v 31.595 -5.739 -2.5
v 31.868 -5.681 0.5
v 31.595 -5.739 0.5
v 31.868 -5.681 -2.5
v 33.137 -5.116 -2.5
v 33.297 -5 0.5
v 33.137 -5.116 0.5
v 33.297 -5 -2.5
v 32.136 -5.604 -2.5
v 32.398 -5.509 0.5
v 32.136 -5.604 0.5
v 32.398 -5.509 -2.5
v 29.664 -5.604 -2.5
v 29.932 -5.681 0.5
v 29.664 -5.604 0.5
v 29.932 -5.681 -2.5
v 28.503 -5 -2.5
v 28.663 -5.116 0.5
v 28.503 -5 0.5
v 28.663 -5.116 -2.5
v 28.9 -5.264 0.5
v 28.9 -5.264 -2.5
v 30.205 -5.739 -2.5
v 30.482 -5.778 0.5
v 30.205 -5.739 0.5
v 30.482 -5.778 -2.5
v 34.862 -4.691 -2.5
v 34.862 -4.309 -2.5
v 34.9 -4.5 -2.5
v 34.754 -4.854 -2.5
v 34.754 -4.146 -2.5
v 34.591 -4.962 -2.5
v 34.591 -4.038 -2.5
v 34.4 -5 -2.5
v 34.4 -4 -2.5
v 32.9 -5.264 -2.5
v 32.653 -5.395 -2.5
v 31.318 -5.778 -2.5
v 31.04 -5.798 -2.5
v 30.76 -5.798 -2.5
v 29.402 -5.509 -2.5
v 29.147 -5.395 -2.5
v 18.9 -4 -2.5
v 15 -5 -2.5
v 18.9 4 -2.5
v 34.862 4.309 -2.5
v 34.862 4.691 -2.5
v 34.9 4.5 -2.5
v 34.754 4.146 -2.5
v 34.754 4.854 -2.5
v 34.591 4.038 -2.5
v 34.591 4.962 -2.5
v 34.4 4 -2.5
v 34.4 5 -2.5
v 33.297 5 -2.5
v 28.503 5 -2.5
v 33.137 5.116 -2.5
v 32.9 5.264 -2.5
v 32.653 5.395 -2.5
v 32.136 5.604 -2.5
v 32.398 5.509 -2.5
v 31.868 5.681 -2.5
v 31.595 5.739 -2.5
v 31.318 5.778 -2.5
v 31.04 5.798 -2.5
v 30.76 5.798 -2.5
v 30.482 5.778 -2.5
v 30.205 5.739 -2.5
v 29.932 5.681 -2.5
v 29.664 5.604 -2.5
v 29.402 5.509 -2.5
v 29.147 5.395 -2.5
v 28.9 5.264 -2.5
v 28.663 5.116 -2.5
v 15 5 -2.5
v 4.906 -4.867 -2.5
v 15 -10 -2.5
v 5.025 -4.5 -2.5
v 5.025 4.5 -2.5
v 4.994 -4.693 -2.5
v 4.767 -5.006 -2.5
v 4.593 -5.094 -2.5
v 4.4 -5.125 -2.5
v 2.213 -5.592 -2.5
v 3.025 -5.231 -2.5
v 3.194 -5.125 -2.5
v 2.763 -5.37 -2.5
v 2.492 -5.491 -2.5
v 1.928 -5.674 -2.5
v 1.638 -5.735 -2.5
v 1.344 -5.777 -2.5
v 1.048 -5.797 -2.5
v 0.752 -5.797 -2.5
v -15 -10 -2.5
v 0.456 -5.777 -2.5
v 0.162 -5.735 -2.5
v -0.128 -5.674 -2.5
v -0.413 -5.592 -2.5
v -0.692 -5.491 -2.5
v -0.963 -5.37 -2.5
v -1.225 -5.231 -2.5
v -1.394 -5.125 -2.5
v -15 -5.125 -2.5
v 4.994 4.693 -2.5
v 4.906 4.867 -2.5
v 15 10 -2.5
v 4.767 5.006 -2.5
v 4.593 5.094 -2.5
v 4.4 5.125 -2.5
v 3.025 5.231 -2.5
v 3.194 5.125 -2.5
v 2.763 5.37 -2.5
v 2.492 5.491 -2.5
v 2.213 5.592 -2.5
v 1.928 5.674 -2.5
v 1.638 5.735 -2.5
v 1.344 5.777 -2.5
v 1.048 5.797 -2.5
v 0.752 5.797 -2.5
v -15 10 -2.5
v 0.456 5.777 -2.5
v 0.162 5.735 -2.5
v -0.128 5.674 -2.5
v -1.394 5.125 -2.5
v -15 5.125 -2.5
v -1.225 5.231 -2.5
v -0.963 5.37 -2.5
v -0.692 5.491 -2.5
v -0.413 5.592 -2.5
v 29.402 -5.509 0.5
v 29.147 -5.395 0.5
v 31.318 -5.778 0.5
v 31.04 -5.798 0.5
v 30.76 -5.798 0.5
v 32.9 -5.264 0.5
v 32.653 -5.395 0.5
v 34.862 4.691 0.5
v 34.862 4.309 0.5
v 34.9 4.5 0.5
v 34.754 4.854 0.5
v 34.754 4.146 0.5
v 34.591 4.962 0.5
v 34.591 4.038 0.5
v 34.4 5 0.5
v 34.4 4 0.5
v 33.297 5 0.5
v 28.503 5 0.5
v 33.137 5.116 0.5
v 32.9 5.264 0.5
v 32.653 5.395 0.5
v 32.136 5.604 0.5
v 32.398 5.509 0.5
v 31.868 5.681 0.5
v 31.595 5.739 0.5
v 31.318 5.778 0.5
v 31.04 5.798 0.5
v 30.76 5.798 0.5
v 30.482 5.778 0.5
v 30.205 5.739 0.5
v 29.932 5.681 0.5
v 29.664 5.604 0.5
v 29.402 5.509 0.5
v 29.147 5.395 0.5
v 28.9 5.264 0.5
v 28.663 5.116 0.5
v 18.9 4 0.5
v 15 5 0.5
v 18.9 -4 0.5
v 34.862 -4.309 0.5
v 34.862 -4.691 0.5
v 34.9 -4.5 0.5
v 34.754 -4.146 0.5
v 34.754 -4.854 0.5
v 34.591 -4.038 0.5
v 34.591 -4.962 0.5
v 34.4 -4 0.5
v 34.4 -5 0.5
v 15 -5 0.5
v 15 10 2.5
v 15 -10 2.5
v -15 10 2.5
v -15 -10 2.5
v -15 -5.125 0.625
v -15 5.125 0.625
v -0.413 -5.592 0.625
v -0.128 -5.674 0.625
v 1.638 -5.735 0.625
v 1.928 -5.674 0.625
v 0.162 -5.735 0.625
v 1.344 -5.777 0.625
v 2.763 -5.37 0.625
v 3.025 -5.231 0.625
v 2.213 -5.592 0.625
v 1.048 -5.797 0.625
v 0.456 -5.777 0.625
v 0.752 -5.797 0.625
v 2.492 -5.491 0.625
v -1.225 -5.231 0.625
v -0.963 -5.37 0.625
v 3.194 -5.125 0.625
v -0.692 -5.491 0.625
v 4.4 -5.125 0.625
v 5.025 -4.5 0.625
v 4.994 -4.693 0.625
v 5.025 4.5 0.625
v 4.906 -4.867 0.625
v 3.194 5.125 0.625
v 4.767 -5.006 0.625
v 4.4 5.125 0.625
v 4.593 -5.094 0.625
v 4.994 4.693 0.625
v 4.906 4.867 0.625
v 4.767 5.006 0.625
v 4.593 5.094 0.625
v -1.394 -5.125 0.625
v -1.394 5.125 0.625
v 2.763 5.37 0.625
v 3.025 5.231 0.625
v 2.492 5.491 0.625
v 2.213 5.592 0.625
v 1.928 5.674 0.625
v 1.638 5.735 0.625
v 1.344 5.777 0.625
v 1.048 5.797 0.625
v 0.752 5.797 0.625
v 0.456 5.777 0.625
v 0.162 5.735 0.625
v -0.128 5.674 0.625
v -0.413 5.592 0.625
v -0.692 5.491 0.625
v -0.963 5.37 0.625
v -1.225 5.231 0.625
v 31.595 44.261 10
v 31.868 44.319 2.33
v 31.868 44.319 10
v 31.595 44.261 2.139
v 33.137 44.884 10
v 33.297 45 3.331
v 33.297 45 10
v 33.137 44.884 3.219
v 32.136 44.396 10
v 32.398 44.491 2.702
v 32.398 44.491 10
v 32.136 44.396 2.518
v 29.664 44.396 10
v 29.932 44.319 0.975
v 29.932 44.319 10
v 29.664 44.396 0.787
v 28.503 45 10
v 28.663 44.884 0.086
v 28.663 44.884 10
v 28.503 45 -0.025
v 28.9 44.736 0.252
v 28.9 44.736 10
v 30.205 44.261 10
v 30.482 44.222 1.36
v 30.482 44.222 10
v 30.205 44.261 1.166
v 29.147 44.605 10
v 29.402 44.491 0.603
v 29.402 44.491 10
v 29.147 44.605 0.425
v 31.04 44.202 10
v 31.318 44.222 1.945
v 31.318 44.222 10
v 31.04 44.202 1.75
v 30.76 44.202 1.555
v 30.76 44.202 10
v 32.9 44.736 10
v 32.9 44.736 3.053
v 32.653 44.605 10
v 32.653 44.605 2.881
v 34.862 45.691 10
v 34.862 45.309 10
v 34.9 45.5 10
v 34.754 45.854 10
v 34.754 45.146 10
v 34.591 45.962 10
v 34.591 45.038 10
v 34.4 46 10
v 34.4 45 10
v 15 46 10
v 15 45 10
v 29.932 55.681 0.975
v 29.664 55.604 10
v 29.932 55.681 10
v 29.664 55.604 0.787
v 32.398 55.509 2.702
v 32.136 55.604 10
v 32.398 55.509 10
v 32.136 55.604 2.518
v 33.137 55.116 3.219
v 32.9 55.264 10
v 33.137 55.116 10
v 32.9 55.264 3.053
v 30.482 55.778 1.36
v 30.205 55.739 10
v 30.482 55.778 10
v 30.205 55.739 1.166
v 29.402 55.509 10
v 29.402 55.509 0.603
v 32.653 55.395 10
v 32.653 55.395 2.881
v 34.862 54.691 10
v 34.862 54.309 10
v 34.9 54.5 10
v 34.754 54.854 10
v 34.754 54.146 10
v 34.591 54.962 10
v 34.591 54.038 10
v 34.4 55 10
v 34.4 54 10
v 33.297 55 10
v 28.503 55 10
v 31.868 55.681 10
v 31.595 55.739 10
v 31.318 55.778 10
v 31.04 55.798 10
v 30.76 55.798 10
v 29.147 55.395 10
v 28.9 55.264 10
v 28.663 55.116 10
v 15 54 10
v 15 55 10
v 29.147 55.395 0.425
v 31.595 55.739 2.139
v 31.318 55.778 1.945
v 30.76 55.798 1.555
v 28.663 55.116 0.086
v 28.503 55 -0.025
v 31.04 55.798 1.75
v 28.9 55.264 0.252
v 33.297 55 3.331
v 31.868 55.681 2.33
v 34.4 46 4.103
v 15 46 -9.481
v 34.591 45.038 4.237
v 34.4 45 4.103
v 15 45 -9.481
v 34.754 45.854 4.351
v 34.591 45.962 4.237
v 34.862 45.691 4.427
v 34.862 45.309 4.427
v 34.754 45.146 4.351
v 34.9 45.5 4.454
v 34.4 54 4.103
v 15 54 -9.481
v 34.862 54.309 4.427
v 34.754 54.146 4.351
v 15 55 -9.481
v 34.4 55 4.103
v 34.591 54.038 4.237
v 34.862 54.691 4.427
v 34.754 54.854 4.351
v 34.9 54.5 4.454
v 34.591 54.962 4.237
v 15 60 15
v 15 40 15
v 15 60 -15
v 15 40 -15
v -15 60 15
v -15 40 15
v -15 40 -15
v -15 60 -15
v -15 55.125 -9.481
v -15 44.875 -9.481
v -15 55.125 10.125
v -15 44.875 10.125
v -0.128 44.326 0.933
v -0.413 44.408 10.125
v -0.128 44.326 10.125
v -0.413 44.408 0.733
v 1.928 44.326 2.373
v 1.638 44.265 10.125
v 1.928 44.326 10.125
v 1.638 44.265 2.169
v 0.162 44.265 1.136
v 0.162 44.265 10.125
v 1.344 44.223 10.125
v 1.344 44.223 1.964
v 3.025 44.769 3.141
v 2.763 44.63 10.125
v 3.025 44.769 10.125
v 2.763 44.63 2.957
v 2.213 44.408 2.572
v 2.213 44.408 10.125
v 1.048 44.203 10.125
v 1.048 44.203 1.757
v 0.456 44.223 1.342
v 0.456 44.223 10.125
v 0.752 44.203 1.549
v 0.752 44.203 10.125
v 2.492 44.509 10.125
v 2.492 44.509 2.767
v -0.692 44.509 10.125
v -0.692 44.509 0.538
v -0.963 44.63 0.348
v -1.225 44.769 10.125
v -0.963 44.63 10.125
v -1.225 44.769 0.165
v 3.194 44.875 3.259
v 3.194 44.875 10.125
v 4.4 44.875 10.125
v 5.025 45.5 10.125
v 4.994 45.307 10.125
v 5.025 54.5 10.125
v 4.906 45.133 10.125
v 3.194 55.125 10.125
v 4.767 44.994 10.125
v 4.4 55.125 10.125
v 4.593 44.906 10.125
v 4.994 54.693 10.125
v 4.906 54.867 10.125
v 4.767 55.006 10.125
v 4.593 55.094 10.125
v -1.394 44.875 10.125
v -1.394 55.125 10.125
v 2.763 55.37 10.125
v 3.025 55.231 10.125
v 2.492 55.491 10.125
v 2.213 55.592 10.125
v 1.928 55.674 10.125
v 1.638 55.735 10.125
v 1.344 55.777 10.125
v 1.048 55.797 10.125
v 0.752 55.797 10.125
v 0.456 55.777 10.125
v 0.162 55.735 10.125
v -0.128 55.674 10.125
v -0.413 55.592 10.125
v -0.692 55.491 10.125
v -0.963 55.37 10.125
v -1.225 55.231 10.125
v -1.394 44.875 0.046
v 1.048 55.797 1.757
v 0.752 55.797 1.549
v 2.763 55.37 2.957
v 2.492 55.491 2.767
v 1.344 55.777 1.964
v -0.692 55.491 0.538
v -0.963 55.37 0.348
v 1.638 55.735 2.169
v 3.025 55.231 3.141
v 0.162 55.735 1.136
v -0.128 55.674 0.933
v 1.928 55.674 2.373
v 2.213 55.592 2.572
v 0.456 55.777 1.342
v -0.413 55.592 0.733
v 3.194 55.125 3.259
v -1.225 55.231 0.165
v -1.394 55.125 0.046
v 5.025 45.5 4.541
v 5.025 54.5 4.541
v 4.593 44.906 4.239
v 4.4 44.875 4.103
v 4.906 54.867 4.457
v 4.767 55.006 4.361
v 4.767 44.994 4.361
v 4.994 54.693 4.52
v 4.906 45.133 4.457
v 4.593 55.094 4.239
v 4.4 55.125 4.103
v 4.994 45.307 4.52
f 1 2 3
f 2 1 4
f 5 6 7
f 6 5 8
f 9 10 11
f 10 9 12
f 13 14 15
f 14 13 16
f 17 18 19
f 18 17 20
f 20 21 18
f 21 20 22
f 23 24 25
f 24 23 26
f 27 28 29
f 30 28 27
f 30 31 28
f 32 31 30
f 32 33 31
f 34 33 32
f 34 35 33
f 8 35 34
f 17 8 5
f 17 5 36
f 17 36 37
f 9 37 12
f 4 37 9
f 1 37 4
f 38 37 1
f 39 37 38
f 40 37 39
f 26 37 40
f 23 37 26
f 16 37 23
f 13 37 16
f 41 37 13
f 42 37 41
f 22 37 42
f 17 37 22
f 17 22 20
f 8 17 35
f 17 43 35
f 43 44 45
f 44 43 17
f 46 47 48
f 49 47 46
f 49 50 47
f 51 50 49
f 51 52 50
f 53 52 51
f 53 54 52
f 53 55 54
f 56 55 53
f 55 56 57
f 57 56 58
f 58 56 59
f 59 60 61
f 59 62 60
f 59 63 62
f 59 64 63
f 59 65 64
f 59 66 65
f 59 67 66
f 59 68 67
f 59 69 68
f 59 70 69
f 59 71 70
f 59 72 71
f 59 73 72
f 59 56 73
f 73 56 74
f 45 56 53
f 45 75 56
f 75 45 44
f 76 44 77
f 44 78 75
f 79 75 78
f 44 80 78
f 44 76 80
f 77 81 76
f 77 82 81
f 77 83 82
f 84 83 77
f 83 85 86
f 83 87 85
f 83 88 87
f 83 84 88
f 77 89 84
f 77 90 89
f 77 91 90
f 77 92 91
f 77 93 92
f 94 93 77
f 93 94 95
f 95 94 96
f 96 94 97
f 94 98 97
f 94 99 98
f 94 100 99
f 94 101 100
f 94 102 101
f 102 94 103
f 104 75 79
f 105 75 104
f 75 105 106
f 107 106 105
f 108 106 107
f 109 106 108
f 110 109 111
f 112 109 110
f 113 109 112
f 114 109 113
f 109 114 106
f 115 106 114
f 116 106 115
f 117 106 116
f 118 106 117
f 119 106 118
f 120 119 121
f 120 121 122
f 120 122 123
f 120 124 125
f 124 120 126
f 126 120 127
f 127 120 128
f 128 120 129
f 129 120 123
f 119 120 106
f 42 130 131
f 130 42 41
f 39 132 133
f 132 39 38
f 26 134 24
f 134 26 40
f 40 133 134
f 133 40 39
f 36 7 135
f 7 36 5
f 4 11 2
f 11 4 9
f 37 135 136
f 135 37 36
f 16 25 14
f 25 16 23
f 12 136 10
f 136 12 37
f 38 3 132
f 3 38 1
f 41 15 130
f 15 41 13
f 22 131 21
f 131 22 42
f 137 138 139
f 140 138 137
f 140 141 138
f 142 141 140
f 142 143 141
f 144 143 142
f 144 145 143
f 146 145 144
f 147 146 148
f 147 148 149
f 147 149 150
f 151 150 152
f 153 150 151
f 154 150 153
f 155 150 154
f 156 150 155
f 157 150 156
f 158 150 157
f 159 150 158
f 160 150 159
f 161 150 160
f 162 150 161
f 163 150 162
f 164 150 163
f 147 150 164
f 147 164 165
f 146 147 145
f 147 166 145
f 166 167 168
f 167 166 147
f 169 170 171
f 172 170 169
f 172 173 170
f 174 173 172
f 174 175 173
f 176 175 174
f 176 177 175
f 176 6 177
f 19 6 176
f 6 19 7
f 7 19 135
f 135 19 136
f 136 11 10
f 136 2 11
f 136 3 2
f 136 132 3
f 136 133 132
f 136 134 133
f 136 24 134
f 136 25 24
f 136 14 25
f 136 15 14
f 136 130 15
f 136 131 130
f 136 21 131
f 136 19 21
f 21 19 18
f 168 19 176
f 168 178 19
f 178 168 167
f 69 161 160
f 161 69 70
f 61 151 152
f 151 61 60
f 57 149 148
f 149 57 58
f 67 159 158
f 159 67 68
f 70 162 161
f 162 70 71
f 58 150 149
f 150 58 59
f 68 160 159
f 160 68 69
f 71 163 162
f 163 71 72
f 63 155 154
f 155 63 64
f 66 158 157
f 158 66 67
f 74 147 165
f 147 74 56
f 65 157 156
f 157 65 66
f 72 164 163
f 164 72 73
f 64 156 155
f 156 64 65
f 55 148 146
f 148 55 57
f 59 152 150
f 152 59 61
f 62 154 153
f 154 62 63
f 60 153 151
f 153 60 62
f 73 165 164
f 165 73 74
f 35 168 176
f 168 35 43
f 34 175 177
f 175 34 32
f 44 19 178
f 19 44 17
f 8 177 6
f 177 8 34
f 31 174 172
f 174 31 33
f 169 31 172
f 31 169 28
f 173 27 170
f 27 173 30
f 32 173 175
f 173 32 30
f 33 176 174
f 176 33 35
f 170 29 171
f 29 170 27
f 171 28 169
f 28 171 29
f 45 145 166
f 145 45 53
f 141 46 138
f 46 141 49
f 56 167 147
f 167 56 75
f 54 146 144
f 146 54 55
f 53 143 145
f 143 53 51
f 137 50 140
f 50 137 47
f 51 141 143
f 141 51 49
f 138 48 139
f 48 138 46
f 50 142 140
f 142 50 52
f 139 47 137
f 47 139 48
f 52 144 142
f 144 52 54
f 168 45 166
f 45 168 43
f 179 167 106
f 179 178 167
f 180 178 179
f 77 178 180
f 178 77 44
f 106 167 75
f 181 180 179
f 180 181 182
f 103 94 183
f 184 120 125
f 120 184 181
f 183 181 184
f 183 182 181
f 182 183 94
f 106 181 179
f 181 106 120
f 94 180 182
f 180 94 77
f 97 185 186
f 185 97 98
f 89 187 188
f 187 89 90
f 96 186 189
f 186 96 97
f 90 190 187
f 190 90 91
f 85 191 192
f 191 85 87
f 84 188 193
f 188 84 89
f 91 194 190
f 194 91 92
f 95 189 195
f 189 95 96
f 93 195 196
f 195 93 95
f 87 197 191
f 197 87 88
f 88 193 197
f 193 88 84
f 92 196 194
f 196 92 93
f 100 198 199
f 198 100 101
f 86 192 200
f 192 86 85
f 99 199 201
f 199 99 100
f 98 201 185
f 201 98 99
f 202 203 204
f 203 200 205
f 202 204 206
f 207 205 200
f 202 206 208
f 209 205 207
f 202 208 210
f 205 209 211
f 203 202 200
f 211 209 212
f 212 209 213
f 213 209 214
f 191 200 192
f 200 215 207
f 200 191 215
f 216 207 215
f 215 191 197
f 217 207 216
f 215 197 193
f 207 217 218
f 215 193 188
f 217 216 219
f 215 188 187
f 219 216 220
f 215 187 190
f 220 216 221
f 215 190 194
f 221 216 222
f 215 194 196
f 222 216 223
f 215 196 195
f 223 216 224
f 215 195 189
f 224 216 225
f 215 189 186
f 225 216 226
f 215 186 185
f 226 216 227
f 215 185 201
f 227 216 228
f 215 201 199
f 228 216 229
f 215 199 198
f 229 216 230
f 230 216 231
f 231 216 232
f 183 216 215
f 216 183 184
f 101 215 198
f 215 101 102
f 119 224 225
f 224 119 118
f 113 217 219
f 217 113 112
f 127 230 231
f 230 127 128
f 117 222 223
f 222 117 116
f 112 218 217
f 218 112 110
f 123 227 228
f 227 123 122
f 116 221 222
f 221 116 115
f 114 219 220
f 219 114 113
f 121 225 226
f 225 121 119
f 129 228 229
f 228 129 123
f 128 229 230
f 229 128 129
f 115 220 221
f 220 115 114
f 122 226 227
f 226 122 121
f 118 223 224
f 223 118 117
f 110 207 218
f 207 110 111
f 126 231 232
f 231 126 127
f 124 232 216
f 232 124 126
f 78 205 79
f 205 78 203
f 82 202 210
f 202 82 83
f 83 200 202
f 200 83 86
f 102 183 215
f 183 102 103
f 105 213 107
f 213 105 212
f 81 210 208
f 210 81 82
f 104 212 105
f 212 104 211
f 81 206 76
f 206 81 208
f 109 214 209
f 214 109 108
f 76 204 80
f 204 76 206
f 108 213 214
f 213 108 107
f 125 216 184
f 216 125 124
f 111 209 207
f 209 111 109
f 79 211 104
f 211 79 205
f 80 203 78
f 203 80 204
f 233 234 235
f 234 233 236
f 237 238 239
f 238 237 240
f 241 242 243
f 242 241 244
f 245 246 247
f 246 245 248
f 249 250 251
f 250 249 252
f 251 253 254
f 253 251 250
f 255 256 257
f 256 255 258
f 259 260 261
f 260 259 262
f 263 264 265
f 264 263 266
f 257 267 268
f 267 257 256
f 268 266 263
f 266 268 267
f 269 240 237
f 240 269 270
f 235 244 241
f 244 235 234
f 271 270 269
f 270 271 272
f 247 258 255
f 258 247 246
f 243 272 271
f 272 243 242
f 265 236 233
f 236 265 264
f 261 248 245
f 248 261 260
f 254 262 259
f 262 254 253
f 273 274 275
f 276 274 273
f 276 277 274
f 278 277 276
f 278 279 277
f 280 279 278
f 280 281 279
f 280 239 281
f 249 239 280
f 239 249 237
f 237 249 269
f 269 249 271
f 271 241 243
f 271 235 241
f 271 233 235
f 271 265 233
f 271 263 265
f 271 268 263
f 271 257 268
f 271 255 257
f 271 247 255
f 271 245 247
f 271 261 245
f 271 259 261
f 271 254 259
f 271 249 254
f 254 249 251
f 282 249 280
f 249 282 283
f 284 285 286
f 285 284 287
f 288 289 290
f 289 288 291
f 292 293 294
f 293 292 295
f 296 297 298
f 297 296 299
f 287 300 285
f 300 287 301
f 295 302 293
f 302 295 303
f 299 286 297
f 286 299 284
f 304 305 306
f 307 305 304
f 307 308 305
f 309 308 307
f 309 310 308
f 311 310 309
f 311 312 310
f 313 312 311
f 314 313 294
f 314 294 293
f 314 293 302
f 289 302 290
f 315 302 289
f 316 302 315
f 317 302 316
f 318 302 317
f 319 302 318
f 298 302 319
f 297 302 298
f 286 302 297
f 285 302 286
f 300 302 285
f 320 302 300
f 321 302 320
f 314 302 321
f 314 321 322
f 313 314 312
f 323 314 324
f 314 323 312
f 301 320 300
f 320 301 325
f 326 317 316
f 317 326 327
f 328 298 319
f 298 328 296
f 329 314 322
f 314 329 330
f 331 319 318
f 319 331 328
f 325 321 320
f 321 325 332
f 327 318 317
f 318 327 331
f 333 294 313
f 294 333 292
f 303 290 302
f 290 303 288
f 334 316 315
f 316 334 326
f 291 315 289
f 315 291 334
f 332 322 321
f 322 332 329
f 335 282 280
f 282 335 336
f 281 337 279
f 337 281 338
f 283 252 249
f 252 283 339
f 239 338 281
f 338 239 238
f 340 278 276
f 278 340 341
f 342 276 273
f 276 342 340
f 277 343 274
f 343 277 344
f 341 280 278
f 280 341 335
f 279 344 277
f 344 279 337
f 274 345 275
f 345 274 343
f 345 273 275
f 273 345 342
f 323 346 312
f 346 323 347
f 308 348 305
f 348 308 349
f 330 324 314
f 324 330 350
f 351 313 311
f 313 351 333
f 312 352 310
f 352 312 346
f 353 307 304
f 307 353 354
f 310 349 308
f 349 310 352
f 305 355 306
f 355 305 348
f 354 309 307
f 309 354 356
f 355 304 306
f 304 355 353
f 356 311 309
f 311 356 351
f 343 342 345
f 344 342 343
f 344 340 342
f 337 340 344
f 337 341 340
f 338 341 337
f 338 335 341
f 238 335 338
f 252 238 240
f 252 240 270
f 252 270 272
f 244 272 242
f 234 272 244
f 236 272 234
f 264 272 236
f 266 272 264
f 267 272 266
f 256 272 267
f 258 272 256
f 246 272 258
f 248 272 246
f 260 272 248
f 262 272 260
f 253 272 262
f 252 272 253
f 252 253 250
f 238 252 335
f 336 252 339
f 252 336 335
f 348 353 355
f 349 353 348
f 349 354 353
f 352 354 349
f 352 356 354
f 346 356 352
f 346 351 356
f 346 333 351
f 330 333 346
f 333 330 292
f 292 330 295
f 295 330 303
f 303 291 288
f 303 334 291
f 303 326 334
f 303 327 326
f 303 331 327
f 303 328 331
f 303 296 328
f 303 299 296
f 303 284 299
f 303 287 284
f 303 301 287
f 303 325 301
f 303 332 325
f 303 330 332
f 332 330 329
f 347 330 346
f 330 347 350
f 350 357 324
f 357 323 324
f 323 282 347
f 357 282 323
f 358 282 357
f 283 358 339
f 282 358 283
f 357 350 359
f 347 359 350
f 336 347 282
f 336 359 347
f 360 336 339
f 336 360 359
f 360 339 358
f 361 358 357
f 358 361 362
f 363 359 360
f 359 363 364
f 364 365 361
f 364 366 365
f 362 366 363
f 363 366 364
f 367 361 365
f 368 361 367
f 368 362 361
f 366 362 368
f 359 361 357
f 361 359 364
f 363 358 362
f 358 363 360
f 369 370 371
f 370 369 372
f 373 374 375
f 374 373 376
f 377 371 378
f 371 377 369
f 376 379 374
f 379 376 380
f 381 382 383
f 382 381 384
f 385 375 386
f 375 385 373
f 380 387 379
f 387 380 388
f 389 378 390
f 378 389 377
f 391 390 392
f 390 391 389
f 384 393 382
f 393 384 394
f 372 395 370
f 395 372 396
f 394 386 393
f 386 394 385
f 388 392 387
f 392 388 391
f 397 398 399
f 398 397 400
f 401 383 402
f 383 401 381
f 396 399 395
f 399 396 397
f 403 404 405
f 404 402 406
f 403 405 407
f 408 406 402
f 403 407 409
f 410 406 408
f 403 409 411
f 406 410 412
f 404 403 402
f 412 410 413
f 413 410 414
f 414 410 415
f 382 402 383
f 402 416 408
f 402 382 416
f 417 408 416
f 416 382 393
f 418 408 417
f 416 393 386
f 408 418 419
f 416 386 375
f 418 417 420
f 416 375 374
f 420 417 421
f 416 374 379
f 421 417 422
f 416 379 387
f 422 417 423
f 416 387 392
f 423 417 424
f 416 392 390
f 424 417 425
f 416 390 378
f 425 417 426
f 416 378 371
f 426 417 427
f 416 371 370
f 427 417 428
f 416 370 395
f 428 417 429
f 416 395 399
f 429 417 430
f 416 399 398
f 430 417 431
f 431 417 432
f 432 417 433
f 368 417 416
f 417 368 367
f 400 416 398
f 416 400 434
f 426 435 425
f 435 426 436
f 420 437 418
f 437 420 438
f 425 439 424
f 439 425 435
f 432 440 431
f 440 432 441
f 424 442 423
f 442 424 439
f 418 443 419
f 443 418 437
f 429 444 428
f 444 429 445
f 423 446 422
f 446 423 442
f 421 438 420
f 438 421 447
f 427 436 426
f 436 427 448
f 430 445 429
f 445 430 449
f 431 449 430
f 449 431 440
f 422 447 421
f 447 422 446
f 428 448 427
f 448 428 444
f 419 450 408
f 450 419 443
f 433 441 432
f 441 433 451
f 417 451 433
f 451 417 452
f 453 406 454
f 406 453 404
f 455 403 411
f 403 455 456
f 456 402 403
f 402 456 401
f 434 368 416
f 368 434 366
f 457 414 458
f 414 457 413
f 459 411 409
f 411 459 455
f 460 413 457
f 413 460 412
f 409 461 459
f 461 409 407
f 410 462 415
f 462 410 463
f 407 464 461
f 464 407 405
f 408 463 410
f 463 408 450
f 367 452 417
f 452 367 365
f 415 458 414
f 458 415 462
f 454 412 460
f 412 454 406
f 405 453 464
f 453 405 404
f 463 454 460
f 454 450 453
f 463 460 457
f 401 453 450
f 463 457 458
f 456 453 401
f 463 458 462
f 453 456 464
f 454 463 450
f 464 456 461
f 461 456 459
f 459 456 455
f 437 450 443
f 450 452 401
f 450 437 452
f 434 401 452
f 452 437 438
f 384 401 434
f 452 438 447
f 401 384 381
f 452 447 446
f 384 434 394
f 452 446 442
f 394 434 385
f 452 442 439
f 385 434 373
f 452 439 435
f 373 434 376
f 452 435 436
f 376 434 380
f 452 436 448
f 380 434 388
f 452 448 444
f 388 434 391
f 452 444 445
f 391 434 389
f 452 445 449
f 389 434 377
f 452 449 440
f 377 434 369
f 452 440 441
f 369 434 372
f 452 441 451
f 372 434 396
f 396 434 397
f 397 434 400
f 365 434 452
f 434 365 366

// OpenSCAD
// parameterized_clip.scad
// Copyright (c)2023 DP design / Daniel Perry
// place this file in the correct OpenSCAD library directory for your operating system,
// then add:
// use parameterized_clip.scad
// to your code


clip_width = 10;
clip_length = 20;
clip_thickness = 20;
clip_arm_width = 1;
clip_body_length = 4;
tab_protrusion = 0.8;
clip_male_female_delta = 0.25;
angled_clip_Boolean = true;    // need a larger clip_thickness to make sense
locking_clip_Boolean = true;

$fs = 0.2;
$fa = 4;

test_body1();
translate([0, 50,0]) test_body2();
//test_body3();

module test_body1() {
    difference() {
        union() {
            cube([30, 20, 5], center = true);
            translate([14.9, 0, -0.5*(5-3)]) male_clip(clip_length, clip_width, 3, clip_arm_width, clip_body_length, tab_protrusion, false, false);

        }
        translate([-15.1, 0, -0.5*(5-3)]) female_clip(clip_length, clip_width, 3, clip_arm_width, clip_body_length, tab_protrusion, false, false, clip_male_female_delta);
    }
}

module test_body2() {   // angled clip
    difference() {
        union() {
            cube([30, 20, 30], center = true);
            translate([14.9, 0, 0]) male_clip( 20, 10, 20, 1, 0, 0.8, true, false );
        }
        translate([-15.1, 0, 0]) female_clip( 20, 10, 20, 1, 0, 0.8, true, false, clip_male_female_delta );
    }
}

module test_body3() {   // angled clip
    difference() {
        union() {
            cube([30, 20, 30], center = true);
            translate([14.9, 0, 0]) male_clip( 20, 10, 20, 1, 0, 0.8, true, true );
        }
        translate([-15.1, 0, 0]) female_clip( 20, 10, 20, 1, 0, 0.8, true, true, clip_male_female_delta );
    }
}


// male_clip( clip_length, clip_width, clip_thickness, clip_arm_width, clip_body_length, tab_protrusion, angled_clip_Boolean, locking_clip_Boolean );
// translate([0, 30, 0])
//      female_clip( clip_length, clip_width, clip_thickness, clip_arm_width, clip_body_length, tab_protrusion, angled_clip_Boolean, locking_clip_Boolean, clip_male_female_delta );

module female_clip(clength, cwidth, cthick, carmw, cbodyl, tabp, acBool, lcBool, delta) {
    tab_dist_from_end = 4;
    tab_radius = 4 + delta;
    blocker_length = 2*tab_radius + 2;
    difference() {
        union() {
            hull() {
                translate([clength - 0.5*carmw, -0.5*(cwidth - carmw), 0]) cylinder( h = cthick + delta, d = carmw + delta, center = true );
                translate([1, -0.5*(cwidth - carmw), 0]) cube([2, carmw + delta, cthick + delta], center = true);
            // }
            // hull() {
                translate([clength - 0.5*carmw, 0.5*(cwidth - carmw), 0]) cylinder( h = cthick + delta, d = carmw + delta, center = true );
                translate([1, 0.5*(cwidth - carmw), 0]) cube([2, carmw + delta, cthick + delta], center = true);
            }
            translate([0.5*cbodyl, 0, 0]) cube([cbodyl, cwidth, cthick + delta], center = true);

            difference() {
                translate([clength - tab_dist_from_end, -0.5*cwidth + tab_radius - tabp, 0]) cylinder(h = cthick + delta, r = tab_radius, center = true);
                translate([clength - tab_dist_from_end, -0.5*cwidth + 0.5*carmw + 0.5*blocker_length, 0]) 
                    cube([blocker_length, blocker_length, cthick + 2], center = true);
                if (lcBool) {
                    translate([clength - 0.5*blocker_length - tab_dist_from_end, -0.5*blocker_length, 0])
                        cube([blocker_length, blocker_length, cthick + 2], center = true);
                }
            }
            difference() {
                translate([clength - tab_dist_from_end, 0.5*cwidth - (tab_radius - tabp), 0]) cylinder(h = cthick + delta, r = tab_radius, center = true);
                translate([clength - tab_dist_from_end, 0.5*cwidth - 0.5*carmw - 0.5*blocker_length, 0]) 
                    cube([blocker_length, blocker_length, cthick + 2], center = true);
                if (lcBool) {
                    translate([clength - 0.5*blocker_length - tab_dist_from_end, cwidth - 0.5*blocker_length, 0])
                        cube([blocker_length, blocker_length, cthick + 2], center = true);
                }
            }
        }
        if (acBool) {
            translate([0.5*clength, 0, -0.5*cthick])  rotate([0, 55, 0])
                cube([clength/(2*sin(55)), 2*cwidth, 5*cthick], center = true );
        }

    }
}

module male_clip(clength, cwidth, cthick, carmw, cbodyl, tabp, acBool, lcBool ) {
    tab_dist_from_end = 4;
    tab_radius = 4;
    blocker_length = 2*tab_radius + 2;
    difference() {
        union() {
            hull() {
                translate([clength - 0.5*carmw, -0.5*(cwidth - carmw), 0]) cylinder( h = cthick, d = carmw, center = true );
                translate([1, -0.5*(cwidth - carmw), 0]) cube([2, carmw, cthick], center = true);
            }
            hull() {
                translate([clength - 0.5*carmw, 0.5*(cwidth - carmw), 0]) cylinder( h = cthick, d = carmw, center = true );
                translate([1, 0.5*(cwidth - carmw), 0]) cube([2, carmw, cthick], center = true);
            }
            translate([0.5*cbodyl, 0, 0]) cube([cbodyl, cwidth, cthick], center = true);

            difference() {
                translate([clength - tab_dist_from_end, -0.5*cwidth + tab_radius - tabp, 0]) cylinder(h = cthick, r = tab_radius, center = true);
                translate([clength - tab_dist_from_end, -0.5*cwidth + 0.5*carmw + 0.5*blocker_length, 0]) 
                    cube([blocker_length, blocker_length, cthick + 2], center = true);
                if (lcBool) {
                    translate([clength - 0.5*blocker_length - tab_dist_from_end, -0.5*blocker_length, 0])
                        cube([blocker_length, blocker_length, cthick + 2], center = true);
                }
            }
            difference() {
                translate([clength - tab_dist_from_end, 0.5*cwidth - (tab_radius - tabp), 0]) cylinder(h = cthick, r = tab_radius, center = true);
                translate([clength - tab_dist_from_end, 0.5*cwidth - 0.5*carmw - 0.5*blocker_length, 0]) 
                    cube([blocker_length, blocker_length, cthick + 2], center = true);
                if (lcBool) {
                    translate([clength - 0.5*blocker_length - tab_dist_from_end, cwidth - 0.5*blocker_length, 0])
                        cube([blocker_length, blocker_length, cthick + 2], center = true);
                }
             }
        }
        if (acBool) {
            translate([0.5*clength, 0, -0.5*cthick])  rotate([0, 55, 0])
                cube([clength/(2*sin(55)), 2*cwidth, 5*cthick], center = true );
        }
    }
}
